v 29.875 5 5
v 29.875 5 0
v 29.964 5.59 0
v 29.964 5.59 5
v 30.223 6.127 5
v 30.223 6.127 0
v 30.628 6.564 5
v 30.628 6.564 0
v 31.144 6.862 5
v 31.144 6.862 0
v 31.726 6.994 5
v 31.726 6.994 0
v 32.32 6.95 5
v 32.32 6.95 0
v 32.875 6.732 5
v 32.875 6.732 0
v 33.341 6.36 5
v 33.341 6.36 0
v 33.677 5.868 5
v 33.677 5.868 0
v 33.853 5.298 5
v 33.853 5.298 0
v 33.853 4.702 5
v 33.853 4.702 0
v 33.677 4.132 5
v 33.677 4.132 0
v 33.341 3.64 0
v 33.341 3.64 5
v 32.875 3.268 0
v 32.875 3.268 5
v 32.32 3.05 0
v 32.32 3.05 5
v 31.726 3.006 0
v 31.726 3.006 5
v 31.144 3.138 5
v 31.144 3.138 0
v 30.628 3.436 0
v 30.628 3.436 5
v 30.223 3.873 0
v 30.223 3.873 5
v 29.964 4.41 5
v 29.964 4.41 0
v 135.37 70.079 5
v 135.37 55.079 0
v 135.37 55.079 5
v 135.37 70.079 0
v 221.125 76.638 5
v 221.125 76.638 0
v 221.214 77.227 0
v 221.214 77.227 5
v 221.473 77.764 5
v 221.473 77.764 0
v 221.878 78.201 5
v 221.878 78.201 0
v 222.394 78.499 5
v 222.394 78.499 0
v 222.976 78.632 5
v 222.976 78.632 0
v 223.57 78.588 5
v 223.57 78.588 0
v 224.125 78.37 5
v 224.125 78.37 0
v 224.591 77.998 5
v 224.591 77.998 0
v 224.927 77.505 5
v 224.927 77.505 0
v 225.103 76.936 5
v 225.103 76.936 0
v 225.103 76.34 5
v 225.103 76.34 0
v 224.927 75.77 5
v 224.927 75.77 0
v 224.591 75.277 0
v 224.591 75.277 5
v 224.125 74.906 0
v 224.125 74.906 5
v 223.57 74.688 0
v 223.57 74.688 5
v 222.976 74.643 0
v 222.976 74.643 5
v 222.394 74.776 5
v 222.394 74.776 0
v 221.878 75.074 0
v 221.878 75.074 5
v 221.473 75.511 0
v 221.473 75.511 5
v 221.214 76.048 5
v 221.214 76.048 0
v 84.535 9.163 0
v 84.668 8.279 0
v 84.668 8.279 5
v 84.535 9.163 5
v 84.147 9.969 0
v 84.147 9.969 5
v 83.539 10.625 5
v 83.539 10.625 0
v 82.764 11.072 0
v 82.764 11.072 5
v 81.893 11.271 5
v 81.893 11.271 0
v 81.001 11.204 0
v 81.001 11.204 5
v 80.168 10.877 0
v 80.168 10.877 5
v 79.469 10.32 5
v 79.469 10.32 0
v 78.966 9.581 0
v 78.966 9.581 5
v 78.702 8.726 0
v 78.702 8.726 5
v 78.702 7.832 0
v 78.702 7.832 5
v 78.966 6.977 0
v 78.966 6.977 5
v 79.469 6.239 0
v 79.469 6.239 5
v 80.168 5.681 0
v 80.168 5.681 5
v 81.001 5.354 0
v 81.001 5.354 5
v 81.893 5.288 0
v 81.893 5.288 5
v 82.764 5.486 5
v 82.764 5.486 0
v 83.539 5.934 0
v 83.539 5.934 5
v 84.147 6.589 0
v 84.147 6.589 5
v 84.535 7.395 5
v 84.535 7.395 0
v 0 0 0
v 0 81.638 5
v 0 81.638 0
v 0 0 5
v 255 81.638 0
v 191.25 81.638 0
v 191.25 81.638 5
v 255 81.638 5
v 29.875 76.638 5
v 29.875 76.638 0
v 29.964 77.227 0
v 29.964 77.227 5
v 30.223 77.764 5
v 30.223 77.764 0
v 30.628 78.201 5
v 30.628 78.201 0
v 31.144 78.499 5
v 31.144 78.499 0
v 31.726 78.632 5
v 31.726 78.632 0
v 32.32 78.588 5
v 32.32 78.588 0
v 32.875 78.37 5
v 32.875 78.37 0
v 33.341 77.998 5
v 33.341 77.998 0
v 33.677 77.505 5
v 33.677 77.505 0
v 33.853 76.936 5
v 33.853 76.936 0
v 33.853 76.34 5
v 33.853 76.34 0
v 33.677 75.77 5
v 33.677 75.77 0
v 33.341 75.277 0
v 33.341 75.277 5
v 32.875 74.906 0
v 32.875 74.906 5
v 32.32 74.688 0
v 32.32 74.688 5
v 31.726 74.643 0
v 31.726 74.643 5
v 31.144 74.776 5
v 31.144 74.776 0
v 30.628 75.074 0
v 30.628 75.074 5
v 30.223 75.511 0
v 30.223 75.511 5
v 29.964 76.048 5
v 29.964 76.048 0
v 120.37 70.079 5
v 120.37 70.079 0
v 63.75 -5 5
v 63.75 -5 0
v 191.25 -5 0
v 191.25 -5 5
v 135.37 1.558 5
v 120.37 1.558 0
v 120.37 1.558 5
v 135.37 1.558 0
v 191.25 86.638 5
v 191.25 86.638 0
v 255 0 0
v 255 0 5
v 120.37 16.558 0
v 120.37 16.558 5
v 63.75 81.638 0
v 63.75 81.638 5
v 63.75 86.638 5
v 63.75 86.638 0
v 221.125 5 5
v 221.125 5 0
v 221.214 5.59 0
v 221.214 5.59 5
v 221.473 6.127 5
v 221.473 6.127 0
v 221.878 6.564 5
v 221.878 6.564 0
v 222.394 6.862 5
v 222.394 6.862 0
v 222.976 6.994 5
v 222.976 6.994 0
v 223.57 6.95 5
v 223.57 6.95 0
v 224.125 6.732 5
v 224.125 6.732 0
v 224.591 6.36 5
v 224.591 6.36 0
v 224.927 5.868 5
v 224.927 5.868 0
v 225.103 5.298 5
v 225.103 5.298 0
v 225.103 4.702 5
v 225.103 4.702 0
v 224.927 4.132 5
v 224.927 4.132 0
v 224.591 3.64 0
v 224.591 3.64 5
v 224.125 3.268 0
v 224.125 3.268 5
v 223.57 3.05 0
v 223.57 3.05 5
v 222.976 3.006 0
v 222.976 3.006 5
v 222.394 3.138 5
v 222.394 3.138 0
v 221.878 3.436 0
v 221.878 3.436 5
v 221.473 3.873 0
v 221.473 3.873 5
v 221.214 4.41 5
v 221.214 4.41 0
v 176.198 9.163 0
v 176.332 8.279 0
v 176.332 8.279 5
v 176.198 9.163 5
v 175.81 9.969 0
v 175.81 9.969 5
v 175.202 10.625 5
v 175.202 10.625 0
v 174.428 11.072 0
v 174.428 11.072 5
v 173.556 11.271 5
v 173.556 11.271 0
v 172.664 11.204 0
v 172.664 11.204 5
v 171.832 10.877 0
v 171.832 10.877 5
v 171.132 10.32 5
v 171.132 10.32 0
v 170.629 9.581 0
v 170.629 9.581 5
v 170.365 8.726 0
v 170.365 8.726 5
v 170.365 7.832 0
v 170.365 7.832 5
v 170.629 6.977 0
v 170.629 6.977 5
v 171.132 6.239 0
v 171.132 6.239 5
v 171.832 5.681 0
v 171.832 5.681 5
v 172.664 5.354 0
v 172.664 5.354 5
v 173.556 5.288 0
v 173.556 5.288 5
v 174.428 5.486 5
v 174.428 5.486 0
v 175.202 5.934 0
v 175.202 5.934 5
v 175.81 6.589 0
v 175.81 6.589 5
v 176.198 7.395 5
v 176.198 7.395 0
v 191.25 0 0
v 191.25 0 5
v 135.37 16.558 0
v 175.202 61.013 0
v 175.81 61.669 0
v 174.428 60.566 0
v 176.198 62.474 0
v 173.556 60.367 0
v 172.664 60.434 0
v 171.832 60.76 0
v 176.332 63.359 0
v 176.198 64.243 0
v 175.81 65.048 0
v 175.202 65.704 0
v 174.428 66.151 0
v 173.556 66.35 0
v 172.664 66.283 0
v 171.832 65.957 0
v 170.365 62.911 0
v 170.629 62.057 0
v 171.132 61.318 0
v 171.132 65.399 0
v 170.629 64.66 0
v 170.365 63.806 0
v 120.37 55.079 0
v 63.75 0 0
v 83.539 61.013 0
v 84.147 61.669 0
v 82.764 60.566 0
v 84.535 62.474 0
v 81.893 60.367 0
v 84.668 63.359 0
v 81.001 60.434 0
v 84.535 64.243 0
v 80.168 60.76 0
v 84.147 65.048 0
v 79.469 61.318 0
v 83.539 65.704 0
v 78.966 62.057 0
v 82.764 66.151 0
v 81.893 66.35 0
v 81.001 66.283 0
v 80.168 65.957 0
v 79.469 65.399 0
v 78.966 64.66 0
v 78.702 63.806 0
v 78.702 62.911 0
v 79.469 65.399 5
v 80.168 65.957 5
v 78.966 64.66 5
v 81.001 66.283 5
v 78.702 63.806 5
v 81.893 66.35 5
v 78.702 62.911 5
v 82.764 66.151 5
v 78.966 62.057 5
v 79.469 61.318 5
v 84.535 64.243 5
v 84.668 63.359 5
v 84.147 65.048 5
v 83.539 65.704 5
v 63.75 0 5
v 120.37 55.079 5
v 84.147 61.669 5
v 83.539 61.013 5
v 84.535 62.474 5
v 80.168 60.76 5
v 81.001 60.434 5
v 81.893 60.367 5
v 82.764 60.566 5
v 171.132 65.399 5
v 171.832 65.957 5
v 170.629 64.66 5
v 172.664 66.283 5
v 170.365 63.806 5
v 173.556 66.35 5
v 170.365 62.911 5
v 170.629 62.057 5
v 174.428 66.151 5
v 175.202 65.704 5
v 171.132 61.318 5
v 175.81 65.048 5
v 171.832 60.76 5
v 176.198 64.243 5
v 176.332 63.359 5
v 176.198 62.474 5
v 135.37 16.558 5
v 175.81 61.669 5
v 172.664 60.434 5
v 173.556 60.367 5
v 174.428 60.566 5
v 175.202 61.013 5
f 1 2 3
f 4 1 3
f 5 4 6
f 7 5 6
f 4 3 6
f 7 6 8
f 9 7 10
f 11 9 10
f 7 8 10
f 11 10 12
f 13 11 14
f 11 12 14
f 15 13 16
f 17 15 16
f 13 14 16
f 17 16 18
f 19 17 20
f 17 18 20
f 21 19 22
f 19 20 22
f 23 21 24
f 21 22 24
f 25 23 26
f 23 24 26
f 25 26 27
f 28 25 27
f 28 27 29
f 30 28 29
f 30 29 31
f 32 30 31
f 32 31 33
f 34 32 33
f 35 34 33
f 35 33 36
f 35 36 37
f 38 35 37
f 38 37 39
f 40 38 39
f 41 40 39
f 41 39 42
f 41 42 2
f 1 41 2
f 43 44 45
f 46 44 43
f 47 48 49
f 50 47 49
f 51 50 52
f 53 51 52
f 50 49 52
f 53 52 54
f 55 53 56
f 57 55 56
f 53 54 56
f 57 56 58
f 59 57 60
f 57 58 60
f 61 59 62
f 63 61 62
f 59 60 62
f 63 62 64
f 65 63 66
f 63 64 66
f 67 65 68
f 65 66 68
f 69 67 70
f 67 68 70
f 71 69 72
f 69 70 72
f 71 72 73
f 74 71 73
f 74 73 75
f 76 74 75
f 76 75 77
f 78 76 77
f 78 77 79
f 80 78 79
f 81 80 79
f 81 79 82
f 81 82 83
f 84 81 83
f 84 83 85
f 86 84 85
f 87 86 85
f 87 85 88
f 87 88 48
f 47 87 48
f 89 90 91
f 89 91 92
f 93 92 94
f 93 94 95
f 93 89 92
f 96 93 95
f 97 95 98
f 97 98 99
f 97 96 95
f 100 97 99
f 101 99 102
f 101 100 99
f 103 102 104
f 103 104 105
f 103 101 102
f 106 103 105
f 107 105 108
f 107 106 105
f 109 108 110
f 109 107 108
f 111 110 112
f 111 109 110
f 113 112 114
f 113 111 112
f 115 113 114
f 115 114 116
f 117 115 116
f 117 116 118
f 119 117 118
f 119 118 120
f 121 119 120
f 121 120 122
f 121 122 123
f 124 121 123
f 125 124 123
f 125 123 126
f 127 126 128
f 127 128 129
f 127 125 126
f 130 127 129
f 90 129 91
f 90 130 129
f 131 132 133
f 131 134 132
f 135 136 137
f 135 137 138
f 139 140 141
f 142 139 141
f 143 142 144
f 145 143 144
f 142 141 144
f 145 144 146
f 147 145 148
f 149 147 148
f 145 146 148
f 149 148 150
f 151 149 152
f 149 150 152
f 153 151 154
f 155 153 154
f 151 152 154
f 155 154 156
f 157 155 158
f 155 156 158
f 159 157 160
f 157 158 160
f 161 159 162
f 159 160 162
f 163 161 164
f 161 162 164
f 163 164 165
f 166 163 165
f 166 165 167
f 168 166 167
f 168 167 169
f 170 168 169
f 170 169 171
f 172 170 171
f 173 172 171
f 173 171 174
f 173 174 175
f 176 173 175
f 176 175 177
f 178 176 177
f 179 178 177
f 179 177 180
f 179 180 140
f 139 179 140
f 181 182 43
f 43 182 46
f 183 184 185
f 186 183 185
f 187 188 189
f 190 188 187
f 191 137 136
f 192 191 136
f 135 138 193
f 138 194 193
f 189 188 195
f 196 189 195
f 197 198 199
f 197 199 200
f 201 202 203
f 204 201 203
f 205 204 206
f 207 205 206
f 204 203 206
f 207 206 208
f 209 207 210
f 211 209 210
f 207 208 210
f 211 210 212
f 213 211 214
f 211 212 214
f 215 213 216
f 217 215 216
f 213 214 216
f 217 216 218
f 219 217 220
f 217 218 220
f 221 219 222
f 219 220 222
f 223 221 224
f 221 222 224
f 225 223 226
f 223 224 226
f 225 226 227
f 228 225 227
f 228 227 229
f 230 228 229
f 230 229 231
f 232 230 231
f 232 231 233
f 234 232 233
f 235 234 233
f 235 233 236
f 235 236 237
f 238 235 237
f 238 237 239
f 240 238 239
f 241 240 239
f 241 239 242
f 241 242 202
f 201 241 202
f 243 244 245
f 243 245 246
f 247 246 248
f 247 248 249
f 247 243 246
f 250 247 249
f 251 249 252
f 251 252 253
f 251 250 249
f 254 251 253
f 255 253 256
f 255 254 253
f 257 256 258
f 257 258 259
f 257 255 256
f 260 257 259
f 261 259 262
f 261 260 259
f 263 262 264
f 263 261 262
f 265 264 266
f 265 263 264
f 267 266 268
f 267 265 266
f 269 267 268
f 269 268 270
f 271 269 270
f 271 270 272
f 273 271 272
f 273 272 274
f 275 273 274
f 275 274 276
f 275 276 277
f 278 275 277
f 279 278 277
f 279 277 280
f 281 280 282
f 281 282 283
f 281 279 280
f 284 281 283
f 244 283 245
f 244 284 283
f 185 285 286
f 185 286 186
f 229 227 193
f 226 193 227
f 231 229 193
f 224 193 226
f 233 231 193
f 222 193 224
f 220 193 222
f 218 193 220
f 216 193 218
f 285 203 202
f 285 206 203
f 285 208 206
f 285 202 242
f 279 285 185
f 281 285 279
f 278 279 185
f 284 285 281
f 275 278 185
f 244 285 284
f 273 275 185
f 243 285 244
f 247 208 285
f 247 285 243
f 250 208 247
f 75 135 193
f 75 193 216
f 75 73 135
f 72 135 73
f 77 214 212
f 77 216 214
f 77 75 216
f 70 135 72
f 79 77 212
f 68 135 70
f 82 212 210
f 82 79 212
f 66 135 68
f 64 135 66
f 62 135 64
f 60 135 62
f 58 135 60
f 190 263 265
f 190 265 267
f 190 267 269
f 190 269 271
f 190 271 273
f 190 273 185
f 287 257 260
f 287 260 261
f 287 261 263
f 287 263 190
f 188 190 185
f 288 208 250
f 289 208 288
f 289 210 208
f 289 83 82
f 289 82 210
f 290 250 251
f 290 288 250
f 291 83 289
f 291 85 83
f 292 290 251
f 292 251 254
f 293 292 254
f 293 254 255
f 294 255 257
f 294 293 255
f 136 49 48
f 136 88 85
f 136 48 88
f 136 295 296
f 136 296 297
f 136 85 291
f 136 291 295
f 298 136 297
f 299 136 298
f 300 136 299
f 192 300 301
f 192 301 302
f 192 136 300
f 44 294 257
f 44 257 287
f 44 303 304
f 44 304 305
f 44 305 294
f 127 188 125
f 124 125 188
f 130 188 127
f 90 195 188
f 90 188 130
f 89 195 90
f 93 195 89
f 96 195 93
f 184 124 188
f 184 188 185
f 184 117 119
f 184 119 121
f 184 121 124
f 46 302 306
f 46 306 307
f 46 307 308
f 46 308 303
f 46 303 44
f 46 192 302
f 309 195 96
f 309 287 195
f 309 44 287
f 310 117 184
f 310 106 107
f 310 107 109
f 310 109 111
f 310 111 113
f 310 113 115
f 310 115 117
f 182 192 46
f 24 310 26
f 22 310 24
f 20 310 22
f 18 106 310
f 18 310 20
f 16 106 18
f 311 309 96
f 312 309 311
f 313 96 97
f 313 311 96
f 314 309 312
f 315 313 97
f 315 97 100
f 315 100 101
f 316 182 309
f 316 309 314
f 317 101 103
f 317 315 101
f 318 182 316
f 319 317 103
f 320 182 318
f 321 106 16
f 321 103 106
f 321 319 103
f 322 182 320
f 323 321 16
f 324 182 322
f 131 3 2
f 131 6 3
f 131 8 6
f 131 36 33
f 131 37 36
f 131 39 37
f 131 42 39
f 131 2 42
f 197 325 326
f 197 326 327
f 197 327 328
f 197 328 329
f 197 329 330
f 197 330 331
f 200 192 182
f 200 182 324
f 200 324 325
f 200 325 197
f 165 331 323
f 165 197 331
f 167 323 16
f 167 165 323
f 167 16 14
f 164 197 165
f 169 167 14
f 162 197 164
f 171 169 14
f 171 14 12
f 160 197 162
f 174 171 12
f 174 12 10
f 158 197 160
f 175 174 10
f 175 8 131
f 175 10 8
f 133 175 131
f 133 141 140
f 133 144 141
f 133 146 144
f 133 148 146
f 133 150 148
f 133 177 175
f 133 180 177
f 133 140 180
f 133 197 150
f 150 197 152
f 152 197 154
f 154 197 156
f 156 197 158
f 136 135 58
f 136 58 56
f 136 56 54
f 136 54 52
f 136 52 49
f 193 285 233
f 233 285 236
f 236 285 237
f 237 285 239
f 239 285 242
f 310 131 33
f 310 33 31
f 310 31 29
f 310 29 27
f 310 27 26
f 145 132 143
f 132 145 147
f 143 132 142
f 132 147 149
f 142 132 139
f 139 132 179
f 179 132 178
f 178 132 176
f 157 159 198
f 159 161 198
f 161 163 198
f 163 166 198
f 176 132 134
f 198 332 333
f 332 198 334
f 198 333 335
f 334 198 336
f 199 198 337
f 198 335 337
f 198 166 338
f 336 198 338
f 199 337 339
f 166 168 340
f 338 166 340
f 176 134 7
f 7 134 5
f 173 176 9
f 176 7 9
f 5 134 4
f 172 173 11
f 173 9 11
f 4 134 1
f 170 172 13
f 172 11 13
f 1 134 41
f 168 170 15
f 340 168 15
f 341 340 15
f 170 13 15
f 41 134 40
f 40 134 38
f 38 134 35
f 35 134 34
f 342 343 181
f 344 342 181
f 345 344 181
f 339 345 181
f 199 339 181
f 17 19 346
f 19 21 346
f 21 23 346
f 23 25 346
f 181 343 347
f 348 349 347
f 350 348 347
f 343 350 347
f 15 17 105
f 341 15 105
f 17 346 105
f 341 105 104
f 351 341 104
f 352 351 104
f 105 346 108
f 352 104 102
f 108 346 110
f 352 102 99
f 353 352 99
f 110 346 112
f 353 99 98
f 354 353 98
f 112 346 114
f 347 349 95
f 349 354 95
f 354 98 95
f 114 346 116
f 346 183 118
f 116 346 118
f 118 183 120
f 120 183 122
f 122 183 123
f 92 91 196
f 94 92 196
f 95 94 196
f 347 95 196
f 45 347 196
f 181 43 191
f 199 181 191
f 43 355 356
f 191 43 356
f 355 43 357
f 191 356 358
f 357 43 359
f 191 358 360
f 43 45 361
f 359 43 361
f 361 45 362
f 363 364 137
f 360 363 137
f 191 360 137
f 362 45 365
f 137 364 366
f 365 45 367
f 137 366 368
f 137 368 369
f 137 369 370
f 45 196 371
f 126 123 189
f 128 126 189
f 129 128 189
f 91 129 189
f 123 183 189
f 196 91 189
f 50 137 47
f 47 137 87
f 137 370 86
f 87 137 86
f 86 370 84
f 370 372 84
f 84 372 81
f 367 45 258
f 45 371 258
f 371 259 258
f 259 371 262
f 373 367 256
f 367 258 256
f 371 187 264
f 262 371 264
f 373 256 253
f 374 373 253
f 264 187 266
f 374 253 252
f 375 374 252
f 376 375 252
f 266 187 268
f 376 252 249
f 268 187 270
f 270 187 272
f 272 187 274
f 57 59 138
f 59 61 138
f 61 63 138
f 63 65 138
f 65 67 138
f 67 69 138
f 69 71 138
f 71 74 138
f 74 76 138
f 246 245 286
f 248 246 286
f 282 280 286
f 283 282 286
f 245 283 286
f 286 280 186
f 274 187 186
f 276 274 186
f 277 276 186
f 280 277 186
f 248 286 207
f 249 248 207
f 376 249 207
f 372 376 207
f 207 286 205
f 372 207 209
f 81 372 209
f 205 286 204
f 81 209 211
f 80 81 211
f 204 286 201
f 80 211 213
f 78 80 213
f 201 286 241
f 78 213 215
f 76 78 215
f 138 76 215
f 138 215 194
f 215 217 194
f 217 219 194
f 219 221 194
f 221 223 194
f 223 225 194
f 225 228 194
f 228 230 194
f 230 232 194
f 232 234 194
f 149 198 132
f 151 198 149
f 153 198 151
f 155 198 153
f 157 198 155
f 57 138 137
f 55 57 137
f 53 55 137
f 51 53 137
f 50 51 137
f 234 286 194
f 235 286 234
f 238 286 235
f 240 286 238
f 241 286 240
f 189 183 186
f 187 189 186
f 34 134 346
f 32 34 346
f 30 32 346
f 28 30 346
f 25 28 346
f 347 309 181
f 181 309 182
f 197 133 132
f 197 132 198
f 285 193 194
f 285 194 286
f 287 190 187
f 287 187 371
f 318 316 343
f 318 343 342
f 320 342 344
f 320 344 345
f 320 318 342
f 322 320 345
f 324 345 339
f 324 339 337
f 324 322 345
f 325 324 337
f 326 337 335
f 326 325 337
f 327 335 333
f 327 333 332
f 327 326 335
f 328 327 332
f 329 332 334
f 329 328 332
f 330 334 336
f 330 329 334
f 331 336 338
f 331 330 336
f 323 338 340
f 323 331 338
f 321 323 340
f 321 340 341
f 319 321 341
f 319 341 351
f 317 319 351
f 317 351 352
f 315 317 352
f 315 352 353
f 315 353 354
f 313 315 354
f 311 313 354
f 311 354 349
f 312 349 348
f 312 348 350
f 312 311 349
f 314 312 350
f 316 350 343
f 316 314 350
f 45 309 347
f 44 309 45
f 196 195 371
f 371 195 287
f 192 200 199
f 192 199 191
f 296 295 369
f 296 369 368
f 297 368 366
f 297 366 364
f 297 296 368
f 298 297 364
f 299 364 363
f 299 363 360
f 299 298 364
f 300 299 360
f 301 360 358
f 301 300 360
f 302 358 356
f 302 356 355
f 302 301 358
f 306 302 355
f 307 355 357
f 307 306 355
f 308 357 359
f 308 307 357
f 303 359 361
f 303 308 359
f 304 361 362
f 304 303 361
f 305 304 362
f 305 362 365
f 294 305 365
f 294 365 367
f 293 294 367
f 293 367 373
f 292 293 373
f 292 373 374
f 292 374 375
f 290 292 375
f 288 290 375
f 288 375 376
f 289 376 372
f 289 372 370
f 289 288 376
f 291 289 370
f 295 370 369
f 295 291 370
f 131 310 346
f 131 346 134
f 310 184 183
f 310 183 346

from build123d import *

# Parameters (mm, degrees)
SKETCH1_R           = 3
SKETCH1_W           = 15
SKETCH1_H           = 15
BOSS_EXTRUDE1_DEPTH = 5
SKETCH2_R           = 1.5
CUT_EXTRUDE1_DEPTH  = 185
SKETCH3_R           = 2
CUT_EXTRUDE2_DEPTH  = 10
SKETCH5_W           = 63.75
SKETCH5_H           = 5
BOSS_EXTRUDE3_DEPTH = 10
SKETCH6_W           = 127.5
SKETCH6_H           = 5
BOSS_EXTRUDE4_DEPTH = 10
SKETCH7_W           = 63.75
SKETCH7_H           = 5
BOSS_EXTRUDE5_DEPTH = 10
SKETCH8_R           = 2
BOSS_EXTRUDE6_DEPTH = 5
SKETCH8_3_R         = 2
CUT_EXTRUDE3_DEPTH  = 10


with BuildPart() as part:
    # Sketch1 → Boss-Extrude1 (new body)
    with BuildSketch(Plane.XY):
        Polygon((191.25, 71.637645579), (255, 71.637645579), (255, 0), (191.25, 0), (191.25, -5), (127.5, -5), (63.75, -5), (63.75, 0), (0, 0), (0, 71.637645579), (63.75, 71.637645579), (63.75, 76.637645579), (127.5, 76.637645579), (191.25, 76.637645579), align=None)
        with Locations((81.6684273, 63.35852795)):
            Circle(SKETCH1_R, mode=Mode.SUBTRACT)
        with Locations((173.3315727, 63.35852795)):
            Circle(SKETCH1_R, mode=Mode.SUBTRACT)
        with Locations((81.6684273, 8.27911763)):
            Circle(SKETCH1_R, mode=Mode.SUBTRACT)
        with Locations((173.3315727, 8.27911763)):
            Circle(SKETCH1_R, mode=Mode.SUBTRACT)
        with Locations((127.870410973, 62.57941032)):
            Rectangle(SKETCH1_W, SKETCH1_H, mode=Mode.SUBTRACT)
        with Locations((127.870410973, 9.058235259)):
            Rectangle(SKETCH1_W, SKETCH1_H, mode=Mode.SUBTRACT)
    extrude(amount=BOSS_EXTRUDE1_DEPTH)

    # Sketch2 → Cut-Extrude1 (cut)
    with BuildSketch(Plane(origin=(0, 0, 0), x_dir=(-1, 0, 0), z_dir=(0, 0, -1))):
        with Locations((-31.875, 5)):
            Circle(SKETCH2_R)
        with Locations((-31.875, 66.637645579)):
            Circle(SKETCH2_R)
        with Locations((-223.125, 66.637645579)):
            Circle(SKETCH2_R)
        with Locations((-223.125, 5)):
            Circle(SKETCH2_R)
    extrude(amount=-CUT_EXTRUDE1_DEPTH, mode=Mode.SUBTRACT)

    # Sketch3 → Cut-Extrude2 (cut)
    with BuildSketch(Plane(origin=(0, 0, 0), x_dir=(-1, 0, 0), z_dir=(0, 0, -1))):
        with Locations((-31.875, 5)):
            Circle(SKETCH3_R)
        with Locations((-31.875, 66.637645579)):
            Circle(SKETCH3_R)
        with Locations((-223.125, 5)):
            Circle(SKETCH3_R)
        with Locations((-223.125, 66.637645579)):
            Circle(SKETCH3_R)
    extrude(amount=-CUT_EXTRUDE2_DEPTH, mode=Mode.SUBTRACT)

    # Sketch5 → Boss-Extrude3 (add)
    with BuildSketch(Plane(origin=(0, 71.637645579, 0), x_dir=(1, 0, 0), z_dir=(0, 1, 0))):
        with Locations((223.125, -2.5)):
            Rectangle(SKETCH5_W, SKETCH5_H)
    extrude(amount=BOSS_EXTRUDE3_DEPTH)

    # Sketch6 → Boss-Extrude4 (add)
    with BuildSketch(Plane(origin=(0, 76.637645579, 0), x_dir=(1, 0, 0), z_dir=(0, 1, 0))):
        with Locations((127.5, -2.5)):
            Rectangle(SKETCH6_W, SKETCH6_H)
    extrude(amount=BOSS_EXTRUDE4_DEPTH)

    # Sketch7 → Boss-Extrude5 (add)
    with BuildSketch(Plane(origin=(0, 71.637645579, 0), x_dir=(1, 0, 0), z_dir=(0, 1, 0))):
        with Locations((31.875, -2.5)):
            Rectangle(SKETCH7_W, SKETCH7_H)
    extrude(amount=BOSS_EXTRUDE5_DEPTH)

    # Sketch8 → Boss-Extrude6 (add)
    with BuildSketch(Plane(origin=(0, 0, 0), x_dir=(-1, 0, 0), z_dir=(0, 0, -1))):
        with Locations((-31.875, 66.637645579)):
            Circle(SKETCH8_R)
        with Locations((-31.875, 76.637645579)):
            Circle(SKETCH8_R)
        with Locations((-223.125, 76.637645579)):
            Circle(SKETCH8_R)
        with Locations((-223.125, 66.637645579)):
            Circle(SKETCH8_R)
    extrude(amount=-BOSS_EXTRUDE6_DEPTH)

    # Sketch8<3> → Cut-Extrude3 (cut)
    with BuildSketch(Plane(origin=(0, 0, 0), x_dir=(-1, 0, 0), z_dir=(0, 0, -1))):
        with Locations((-31.875, 76.637645579)):
            Circle(SKETCH8_3_R)
        with Locations((-223.125, 76.637645579)):
            Circle(SKETCH8_3_R)
    extrude(amount=-CUT_EXTRUDE3_DEPTH, mode=Mode.SUBTRACT)


solid = part.part
